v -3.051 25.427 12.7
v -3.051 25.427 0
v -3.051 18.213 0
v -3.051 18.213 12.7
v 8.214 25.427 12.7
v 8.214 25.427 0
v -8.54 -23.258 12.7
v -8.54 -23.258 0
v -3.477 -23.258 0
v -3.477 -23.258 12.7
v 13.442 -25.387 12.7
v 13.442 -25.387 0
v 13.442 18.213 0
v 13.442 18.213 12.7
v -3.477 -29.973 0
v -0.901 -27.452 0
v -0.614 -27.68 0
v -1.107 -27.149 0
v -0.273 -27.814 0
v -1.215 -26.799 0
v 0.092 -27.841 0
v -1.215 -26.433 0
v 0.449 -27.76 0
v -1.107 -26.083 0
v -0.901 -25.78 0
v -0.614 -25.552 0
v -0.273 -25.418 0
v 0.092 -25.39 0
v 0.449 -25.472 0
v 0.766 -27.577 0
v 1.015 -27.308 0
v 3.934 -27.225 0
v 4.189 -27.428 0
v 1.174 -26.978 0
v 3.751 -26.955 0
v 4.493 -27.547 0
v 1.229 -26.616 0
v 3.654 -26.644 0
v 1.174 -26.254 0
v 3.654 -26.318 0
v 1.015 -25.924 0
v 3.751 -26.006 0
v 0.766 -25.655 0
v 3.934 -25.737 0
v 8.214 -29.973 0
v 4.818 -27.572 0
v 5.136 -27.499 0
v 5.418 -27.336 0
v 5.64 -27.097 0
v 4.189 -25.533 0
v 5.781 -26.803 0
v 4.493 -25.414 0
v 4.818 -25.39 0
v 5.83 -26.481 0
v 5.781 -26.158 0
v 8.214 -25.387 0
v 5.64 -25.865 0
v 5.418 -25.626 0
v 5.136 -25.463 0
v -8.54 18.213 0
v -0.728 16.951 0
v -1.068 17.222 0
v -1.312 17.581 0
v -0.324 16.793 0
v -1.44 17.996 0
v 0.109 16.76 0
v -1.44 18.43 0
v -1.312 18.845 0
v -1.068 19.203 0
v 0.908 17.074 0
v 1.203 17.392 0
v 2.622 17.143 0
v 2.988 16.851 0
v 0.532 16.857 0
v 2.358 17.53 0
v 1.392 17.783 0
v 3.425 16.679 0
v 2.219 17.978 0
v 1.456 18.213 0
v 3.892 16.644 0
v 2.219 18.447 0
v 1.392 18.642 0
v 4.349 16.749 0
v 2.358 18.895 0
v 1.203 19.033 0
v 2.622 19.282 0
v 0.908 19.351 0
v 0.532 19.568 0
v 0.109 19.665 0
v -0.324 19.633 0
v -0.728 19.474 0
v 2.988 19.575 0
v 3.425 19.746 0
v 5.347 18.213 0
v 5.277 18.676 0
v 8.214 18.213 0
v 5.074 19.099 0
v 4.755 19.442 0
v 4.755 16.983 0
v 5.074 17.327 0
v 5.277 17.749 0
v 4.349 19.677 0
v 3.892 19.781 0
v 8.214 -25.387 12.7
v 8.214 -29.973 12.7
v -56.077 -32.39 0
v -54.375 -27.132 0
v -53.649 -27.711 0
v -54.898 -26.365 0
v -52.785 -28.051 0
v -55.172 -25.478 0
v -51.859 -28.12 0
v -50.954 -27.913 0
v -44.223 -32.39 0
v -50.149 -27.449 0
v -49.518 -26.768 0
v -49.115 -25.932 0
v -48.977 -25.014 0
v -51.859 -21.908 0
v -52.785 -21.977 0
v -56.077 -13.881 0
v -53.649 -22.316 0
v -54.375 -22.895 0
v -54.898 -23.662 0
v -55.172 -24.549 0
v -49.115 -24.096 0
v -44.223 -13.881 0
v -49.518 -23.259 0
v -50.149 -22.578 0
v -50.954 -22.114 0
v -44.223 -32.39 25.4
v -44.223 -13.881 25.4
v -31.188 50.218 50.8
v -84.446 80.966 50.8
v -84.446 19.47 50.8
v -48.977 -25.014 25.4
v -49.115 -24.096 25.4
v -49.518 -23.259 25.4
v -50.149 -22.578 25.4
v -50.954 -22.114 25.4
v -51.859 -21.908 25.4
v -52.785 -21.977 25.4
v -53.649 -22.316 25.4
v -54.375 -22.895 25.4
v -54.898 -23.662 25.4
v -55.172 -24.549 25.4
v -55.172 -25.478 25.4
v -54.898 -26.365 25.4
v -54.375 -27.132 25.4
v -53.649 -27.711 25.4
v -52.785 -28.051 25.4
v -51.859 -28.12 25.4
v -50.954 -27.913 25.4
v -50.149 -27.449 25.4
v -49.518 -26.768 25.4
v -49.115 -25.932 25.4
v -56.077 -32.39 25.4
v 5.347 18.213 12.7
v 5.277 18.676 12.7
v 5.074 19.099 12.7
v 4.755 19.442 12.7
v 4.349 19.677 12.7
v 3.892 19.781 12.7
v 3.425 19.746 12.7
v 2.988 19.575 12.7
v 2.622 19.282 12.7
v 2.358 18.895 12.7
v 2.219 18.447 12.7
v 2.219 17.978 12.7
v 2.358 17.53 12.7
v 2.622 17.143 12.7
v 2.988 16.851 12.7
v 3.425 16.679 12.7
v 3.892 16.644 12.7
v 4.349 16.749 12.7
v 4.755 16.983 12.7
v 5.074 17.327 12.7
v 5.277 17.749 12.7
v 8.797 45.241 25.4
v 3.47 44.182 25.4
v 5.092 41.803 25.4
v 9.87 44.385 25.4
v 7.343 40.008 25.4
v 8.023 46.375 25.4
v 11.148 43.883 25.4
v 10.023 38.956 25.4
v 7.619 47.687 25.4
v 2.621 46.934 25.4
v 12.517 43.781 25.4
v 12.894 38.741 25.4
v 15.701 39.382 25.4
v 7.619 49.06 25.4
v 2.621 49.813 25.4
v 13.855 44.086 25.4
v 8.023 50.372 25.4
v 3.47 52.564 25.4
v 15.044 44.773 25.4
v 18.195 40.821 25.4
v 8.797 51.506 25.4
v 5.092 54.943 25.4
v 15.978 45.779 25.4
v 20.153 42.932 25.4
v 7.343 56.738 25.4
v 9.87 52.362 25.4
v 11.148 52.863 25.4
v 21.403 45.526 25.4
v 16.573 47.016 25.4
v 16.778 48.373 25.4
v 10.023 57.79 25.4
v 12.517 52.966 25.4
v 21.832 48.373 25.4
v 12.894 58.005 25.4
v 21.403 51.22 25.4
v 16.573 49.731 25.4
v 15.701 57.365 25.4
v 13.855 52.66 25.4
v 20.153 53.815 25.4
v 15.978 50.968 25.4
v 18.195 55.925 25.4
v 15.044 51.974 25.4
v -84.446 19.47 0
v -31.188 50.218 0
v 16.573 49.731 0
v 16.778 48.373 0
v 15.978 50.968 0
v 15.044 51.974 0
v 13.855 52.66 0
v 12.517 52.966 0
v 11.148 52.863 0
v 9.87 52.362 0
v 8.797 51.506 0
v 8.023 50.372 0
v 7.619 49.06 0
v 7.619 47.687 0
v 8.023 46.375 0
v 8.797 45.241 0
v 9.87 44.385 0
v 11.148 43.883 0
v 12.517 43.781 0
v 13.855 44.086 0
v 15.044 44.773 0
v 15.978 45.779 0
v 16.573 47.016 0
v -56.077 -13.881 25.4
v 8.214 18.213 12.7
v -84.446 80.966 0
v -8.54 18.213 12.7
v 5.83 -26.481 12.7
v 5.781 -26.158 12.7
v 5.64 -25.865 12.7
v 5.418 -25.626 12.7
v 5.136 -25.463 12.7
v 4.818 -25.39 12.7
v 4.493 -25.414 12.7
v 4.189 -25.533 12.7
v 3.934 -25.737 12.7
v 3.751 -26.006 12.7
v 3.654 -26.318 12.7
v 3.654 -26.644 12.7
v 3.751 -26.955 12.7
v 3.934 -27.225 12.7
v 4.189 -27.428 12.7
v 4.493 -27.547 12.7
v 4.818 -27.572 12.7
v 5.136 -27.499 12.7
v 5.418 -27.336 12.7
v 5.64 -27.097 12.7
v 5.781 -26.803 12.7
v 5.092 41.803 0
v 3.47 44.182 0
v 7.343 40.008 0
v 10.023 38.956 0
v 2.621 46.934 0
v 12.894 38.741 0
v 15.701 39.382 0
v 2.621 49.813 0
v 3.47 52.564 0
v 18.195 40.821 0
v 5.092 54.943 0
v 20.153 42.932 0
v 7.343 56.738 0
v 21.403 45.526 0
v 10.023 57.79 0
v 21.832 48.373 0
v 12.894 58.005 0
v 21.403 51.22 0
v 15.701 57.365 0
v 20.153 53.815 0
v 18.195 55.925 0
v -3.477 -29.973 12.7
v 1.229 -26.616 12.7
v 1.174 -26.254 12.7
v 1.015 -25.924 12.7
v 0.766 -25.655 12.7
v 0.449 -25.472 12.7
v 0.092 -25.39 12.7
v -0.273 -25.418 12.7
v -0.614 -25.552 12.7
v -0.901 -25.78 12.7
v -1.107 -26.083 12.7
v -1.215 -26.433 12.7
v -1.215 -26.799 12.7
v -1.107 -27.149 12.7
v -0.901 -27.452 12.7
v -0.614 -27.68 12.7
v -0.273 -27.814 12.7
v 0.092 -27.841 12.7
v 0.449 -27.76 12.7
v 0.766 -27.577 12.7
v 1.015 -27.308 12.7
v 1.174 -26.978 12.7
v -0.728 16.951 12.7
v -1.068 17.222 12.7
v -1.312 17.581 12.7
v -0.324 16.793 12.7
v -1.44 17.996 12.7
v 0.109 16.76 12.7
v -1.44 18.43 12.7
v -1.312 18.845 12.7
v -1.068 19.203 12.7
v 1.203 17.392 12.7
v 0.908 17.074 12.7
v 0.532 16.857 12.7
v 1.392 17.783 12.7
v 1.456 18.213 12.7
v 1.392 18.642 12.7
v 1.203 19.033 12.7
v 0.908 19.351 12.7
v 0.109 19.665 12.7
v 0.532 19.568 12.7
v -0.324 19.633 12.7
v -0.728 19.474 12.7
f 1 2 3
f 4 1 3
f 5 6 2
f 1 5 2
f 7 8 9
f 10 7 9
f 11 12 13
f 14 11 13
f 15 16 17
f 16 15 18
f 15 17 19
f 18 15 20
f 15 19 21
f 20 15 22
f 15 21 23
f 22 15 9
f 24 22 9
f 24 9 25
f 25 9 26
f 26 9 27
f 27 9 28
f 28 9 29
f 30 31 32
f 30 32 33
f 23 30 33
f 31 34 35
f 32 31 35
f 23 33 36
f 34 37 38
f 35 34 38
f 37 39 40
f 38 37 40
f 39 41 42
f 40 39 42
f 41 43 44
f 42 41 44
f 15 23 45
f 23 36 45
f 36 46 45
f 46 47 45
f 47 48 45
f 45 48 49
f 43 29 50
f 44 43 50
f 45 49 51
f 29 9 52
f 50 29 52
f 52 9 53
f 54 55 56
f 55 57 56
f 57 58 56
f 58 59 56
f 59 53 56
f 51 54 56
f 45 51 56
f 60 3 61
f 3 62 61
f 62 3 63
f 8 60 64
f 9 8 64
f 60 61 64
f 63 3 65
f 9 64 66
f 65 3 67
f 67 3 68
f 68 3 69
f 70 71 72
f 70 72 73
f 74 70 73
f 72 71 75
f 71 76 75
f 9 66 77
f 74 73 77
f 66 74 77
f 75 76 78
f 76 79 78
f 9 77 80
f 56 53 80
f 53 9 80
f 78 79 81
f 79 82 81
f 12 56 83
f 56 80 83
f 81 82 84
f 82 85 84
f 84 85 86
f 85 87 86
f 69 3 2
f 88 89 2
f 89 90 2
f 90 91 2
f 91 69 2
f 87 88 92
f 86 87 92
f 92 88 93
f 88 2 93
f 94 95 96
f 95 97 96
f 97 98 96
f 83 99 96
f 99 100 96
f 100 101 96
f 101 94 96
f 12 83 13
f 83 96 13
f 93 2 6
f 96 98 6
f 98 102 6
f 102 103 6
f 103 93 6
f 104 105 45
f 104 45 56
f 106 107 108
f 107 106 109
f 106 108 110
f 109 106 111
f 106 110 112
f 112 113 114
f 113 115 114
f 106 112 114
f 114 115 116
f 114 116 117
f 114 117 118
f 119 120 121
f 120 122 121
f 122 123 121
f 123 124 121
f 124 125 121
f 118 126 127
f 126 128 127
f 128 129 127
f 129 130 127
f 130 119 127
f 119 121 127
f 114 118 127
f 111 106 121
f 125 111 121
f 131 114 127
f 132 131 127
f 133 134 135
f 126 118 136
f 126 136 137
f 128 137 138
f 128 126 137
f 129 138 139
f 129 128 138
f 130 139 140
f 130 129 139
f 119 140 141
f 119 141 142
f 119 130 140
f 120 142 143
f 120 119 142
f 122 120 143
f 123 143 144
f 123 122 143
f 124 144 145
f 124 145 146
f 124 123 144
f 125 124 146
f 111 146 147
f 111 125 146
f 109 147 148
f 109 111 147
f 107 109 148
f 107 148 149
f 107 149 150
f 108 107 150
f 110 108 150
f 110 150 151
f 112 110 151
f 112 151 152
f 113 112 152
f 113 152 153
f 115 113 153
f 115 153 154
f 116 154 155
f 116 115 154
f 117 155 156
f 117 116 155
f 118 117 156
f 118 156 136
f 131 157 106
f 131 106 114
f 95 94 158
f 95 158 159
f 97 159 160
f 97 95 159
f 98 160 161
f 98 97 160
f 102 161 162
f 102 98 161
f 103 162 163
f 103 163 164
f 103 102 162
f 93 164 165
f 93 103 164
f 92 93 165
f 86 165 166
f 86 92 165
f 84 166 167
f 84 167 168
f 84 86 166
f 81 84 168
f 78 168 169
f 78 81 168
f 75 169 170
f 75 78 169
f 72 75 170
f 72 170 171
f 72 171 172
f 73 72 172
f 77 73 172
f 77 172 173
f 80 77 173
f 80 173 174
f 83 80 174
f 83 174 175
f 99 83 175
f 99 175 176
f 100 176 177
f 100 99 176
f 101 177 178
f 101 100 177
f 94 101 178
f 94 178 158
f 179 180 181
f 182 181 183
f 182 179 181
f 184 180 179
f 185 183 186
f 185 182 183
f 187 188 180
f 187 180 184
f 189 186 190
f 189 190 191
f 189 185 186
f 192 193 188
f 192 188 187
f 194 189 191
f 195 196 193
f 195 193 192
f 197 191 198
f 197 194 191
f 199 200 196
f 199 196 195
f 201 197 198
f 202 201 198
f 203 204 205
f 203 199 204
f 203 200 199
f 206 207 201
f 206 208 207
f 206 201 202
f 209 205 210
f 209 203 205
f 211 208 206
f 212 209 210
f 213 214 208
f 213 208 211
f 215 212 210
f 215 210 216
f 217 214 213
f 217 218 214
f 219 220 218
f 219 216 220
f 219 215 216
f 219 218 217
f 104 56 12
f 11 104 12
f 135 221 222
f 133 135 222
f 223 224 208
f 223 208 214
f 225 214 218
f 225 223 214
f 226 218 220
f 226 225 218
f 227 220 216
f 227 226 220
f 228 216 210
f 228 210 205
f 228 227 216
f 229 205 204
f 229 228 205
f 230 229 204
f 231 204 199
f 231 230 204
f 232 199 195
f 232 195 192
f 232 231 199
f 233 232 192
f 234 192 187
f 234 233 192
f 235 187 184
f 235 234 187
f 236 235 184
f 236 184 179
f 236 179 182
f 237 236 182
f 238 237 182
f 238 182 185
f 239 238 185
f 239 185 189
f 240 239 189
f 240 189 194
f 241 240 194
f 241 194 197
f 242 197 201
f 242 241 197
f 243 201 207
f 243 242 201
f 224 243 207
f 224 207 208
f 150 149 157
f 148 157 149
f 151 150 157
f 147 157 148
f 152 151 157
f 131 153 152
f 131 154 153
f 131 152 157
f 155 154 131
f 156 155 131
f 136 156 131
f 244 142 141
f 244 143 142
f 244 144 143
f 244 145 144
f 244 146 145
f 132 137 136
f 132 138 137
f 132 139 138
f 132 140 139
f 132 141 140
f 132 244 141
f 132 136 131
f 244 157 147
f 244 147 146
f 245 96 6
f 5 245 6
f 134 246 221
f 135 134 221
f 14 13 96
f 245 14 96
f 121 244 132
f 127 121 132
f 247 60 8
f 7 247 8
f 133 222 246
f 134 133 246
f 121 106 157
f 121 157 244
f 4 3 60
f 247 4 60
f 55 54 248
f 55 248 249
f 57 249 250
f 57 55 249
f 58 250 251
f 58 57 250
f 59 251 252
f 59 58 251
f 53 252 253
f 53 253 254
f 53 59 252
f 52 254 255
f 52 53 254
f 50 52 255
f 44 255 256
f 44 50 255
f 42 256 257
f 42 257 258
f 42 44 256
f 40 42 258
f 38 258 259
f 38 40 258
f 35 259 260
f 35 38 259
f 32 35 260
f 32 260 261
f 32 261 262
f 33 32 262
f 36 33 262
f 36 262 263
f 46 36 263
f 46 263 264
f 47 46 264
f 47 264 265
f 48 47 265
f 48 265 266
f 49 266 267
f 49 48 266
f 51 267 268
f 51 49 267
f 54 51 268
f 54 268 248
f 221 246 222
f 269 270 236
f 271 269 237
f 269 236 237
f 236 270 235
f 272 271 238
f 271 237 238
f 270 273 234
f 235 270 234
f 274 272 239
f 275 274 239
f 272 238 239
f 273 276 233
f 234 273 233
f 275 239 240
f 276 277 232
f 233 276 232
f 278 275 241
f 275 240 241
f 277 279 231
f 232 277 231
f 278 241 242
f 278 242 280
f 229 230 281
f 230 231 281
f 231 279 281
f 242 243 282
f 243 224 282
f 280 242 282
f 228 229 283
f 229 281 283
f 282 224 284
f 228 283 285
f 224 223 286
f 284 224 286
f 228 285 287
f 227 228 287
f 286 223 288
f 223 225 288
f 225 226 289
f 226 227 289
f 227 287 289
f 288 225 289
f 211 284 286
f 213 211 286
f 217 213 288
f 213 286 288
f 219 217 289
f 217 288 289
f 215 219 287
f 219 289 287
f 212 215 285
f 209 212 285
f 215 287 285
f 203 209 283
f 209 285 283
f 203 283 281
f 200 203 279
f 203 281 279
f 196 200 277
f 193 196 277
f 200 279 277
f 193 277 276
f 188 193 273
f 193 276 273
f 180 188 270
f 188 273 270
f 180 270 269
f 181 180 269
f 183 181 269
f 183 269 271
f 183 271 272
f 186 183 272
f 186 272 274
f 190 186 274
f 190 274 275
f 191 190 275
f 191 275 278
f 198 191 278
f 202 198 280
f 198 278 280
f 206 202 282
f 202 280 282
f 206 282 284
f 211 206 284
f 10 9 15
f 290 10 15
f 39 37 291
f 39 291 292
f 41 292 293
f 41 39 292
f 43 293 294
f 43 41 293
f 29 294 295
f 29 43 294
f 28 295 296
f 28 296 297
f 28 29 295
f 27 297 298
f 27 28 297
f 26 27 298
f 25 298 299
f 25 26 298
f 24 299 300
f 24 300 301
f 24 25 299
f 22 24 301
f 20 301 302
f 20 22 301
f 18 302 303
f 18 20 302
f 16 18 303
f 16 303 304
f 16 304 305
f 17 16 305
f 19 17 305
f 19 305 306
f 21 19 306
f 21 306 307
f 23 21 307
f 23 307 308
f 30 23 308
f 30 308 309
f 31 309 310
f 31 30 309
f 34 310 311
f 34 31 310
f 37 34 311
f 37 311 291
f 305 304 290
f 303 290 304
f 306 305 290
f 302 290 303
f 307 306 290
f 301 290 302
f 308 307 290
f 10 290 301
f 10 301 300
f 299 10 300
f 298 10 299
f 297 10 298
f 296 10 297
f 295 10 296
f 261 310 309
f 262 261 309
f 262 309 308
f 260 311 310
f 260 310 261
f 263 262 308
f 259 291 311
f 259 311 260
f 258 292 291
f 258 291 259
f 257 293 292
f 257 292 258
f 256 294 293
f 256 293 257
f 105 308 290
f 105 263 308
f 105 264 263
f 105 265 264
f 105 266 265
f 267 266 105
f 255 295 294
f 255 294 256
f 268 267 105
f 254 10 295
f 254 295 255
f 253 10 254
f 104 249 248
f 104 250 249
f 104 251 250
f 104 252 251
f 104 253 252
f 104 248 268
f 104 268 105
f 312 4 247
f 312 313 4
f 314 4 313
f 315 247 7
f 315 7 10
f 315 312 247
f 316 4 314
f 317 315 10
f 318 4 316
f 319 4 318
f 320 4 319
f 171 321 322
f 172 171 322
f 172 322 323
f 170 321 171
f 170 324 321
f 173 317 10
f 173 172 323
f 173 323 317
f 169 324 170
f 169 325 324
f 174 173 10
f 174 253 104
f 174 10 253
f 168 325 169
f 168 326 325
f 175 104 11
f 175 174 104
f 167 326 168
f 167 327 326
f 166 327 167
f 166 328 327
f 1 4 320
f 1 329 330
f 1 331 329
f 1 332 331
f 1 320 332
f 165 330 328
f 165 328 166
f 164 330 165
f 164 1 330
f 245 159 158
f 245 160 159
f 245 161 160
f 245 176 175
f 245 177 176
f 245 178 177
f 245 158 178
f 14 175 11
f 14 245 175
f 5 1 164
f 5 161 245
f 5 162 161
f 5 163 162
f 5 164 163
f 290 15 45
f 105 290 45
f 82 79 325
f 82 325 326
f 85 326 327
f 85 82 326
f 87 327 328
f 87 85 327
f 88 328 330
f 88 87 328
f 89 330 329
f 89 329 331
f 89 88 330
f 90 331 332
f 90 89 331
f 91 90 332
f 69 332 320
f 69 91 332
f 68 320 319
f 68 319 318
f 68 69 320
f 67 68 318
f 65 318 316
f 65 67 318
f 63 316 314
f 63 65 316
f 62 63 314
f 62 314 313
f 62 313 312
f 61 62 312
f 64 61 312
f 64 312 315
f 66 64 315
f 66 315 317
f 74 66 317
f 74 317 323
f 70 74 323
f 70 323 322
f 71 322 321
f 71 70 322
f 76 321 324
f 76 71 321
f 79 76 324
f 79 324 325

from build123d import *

# Parameters (mm, degrees)
F0_R     = 1.228855
F0_R_2   = 1.093859
F0_R_3   = 1.456344
F0_R_4   = 1.572638
F1_DEPTH = 12.7
F2_W     = 11.854053
F2_H     = 18.508531
F2_R     = 3.114902
F3_DEPTH = 25.4
F4_R     = 9.65917
F4_R_2   = 4.605393
F5_DEPTH = 25.4
F7_DEPTH = 50.8


with BuildPart() as f1:
    # F0 (on Top) → F1 (new body)
    with BuildSketch(Plane.XY):
        Polygon((8.214151, 25.427094), (-3.051329, 25.427094), (-3.051329, 18.212683), (-8.53976, 18.212683), (-8.53976, -23.258118), (-3.477043, -23.258118), (-3.477043, -29.973447), (8.214151, -29.973447), (8.214151, -25.386928), (13.441963, -25.386928), (13.441963, 18.212683), (8.214151, 18.212683), align=None)
        with Locations((0, -26.615783)):
            Circle(F0_R, mode=Mode.SUBTRACT)
        with Locations((4.736043, -26.480787)):
            Circle(F0_R_2, mode=Mode.SUBTRACT)
        with Locations((0, 18.212683)):
            Circle(F0_R_3, mode=Mode.SUBTRACT)
        with Locations((3.774539, 18.212683)):
            Circle(F0_R_4, mode=Mode.SUBTRACT)
    extrude(amount=F1_DEPTH)


with BuildPart() as f3:
    # F2 (on Top) → F3 (new body)
    with BuildSketch(Plane.XY):
        with Locations((-50.149727, -23.135323)):
            Rectangle(F2_W, F2_H)
        with Locations((-52.091528, -25.013741)):
            Circle(F2_R, mode=Mode.SUBTRACT)
    extrude(amount=F3_DEPTH)


with BuildPart() as f5:
    # F4 (on Top) → F5 (new body)
    with BuildSketch(Plane.XY):
        with Locations((12.172529, 48.373301)):
            Circle(F4_R)
        with Locations((12.172529, 48.373301)):
            Circle(F4_R_2, mode=Mode.SUBTRACT)
    extrude(amount=F5_DEPTH)


with BuildPart() as f7:
    # F6 (on Top) → F7 (new body)
    with BuildSketch(Plane.XY):
        Polygon((-84.445715, 80.966448), (-84.445715, 19.470016), (-31.188242, 50.218232), align=None)
    extrude(amount=F7_DEPTH)


solid = Compound([f1.part, f3.part, f5.part, f7.part])
